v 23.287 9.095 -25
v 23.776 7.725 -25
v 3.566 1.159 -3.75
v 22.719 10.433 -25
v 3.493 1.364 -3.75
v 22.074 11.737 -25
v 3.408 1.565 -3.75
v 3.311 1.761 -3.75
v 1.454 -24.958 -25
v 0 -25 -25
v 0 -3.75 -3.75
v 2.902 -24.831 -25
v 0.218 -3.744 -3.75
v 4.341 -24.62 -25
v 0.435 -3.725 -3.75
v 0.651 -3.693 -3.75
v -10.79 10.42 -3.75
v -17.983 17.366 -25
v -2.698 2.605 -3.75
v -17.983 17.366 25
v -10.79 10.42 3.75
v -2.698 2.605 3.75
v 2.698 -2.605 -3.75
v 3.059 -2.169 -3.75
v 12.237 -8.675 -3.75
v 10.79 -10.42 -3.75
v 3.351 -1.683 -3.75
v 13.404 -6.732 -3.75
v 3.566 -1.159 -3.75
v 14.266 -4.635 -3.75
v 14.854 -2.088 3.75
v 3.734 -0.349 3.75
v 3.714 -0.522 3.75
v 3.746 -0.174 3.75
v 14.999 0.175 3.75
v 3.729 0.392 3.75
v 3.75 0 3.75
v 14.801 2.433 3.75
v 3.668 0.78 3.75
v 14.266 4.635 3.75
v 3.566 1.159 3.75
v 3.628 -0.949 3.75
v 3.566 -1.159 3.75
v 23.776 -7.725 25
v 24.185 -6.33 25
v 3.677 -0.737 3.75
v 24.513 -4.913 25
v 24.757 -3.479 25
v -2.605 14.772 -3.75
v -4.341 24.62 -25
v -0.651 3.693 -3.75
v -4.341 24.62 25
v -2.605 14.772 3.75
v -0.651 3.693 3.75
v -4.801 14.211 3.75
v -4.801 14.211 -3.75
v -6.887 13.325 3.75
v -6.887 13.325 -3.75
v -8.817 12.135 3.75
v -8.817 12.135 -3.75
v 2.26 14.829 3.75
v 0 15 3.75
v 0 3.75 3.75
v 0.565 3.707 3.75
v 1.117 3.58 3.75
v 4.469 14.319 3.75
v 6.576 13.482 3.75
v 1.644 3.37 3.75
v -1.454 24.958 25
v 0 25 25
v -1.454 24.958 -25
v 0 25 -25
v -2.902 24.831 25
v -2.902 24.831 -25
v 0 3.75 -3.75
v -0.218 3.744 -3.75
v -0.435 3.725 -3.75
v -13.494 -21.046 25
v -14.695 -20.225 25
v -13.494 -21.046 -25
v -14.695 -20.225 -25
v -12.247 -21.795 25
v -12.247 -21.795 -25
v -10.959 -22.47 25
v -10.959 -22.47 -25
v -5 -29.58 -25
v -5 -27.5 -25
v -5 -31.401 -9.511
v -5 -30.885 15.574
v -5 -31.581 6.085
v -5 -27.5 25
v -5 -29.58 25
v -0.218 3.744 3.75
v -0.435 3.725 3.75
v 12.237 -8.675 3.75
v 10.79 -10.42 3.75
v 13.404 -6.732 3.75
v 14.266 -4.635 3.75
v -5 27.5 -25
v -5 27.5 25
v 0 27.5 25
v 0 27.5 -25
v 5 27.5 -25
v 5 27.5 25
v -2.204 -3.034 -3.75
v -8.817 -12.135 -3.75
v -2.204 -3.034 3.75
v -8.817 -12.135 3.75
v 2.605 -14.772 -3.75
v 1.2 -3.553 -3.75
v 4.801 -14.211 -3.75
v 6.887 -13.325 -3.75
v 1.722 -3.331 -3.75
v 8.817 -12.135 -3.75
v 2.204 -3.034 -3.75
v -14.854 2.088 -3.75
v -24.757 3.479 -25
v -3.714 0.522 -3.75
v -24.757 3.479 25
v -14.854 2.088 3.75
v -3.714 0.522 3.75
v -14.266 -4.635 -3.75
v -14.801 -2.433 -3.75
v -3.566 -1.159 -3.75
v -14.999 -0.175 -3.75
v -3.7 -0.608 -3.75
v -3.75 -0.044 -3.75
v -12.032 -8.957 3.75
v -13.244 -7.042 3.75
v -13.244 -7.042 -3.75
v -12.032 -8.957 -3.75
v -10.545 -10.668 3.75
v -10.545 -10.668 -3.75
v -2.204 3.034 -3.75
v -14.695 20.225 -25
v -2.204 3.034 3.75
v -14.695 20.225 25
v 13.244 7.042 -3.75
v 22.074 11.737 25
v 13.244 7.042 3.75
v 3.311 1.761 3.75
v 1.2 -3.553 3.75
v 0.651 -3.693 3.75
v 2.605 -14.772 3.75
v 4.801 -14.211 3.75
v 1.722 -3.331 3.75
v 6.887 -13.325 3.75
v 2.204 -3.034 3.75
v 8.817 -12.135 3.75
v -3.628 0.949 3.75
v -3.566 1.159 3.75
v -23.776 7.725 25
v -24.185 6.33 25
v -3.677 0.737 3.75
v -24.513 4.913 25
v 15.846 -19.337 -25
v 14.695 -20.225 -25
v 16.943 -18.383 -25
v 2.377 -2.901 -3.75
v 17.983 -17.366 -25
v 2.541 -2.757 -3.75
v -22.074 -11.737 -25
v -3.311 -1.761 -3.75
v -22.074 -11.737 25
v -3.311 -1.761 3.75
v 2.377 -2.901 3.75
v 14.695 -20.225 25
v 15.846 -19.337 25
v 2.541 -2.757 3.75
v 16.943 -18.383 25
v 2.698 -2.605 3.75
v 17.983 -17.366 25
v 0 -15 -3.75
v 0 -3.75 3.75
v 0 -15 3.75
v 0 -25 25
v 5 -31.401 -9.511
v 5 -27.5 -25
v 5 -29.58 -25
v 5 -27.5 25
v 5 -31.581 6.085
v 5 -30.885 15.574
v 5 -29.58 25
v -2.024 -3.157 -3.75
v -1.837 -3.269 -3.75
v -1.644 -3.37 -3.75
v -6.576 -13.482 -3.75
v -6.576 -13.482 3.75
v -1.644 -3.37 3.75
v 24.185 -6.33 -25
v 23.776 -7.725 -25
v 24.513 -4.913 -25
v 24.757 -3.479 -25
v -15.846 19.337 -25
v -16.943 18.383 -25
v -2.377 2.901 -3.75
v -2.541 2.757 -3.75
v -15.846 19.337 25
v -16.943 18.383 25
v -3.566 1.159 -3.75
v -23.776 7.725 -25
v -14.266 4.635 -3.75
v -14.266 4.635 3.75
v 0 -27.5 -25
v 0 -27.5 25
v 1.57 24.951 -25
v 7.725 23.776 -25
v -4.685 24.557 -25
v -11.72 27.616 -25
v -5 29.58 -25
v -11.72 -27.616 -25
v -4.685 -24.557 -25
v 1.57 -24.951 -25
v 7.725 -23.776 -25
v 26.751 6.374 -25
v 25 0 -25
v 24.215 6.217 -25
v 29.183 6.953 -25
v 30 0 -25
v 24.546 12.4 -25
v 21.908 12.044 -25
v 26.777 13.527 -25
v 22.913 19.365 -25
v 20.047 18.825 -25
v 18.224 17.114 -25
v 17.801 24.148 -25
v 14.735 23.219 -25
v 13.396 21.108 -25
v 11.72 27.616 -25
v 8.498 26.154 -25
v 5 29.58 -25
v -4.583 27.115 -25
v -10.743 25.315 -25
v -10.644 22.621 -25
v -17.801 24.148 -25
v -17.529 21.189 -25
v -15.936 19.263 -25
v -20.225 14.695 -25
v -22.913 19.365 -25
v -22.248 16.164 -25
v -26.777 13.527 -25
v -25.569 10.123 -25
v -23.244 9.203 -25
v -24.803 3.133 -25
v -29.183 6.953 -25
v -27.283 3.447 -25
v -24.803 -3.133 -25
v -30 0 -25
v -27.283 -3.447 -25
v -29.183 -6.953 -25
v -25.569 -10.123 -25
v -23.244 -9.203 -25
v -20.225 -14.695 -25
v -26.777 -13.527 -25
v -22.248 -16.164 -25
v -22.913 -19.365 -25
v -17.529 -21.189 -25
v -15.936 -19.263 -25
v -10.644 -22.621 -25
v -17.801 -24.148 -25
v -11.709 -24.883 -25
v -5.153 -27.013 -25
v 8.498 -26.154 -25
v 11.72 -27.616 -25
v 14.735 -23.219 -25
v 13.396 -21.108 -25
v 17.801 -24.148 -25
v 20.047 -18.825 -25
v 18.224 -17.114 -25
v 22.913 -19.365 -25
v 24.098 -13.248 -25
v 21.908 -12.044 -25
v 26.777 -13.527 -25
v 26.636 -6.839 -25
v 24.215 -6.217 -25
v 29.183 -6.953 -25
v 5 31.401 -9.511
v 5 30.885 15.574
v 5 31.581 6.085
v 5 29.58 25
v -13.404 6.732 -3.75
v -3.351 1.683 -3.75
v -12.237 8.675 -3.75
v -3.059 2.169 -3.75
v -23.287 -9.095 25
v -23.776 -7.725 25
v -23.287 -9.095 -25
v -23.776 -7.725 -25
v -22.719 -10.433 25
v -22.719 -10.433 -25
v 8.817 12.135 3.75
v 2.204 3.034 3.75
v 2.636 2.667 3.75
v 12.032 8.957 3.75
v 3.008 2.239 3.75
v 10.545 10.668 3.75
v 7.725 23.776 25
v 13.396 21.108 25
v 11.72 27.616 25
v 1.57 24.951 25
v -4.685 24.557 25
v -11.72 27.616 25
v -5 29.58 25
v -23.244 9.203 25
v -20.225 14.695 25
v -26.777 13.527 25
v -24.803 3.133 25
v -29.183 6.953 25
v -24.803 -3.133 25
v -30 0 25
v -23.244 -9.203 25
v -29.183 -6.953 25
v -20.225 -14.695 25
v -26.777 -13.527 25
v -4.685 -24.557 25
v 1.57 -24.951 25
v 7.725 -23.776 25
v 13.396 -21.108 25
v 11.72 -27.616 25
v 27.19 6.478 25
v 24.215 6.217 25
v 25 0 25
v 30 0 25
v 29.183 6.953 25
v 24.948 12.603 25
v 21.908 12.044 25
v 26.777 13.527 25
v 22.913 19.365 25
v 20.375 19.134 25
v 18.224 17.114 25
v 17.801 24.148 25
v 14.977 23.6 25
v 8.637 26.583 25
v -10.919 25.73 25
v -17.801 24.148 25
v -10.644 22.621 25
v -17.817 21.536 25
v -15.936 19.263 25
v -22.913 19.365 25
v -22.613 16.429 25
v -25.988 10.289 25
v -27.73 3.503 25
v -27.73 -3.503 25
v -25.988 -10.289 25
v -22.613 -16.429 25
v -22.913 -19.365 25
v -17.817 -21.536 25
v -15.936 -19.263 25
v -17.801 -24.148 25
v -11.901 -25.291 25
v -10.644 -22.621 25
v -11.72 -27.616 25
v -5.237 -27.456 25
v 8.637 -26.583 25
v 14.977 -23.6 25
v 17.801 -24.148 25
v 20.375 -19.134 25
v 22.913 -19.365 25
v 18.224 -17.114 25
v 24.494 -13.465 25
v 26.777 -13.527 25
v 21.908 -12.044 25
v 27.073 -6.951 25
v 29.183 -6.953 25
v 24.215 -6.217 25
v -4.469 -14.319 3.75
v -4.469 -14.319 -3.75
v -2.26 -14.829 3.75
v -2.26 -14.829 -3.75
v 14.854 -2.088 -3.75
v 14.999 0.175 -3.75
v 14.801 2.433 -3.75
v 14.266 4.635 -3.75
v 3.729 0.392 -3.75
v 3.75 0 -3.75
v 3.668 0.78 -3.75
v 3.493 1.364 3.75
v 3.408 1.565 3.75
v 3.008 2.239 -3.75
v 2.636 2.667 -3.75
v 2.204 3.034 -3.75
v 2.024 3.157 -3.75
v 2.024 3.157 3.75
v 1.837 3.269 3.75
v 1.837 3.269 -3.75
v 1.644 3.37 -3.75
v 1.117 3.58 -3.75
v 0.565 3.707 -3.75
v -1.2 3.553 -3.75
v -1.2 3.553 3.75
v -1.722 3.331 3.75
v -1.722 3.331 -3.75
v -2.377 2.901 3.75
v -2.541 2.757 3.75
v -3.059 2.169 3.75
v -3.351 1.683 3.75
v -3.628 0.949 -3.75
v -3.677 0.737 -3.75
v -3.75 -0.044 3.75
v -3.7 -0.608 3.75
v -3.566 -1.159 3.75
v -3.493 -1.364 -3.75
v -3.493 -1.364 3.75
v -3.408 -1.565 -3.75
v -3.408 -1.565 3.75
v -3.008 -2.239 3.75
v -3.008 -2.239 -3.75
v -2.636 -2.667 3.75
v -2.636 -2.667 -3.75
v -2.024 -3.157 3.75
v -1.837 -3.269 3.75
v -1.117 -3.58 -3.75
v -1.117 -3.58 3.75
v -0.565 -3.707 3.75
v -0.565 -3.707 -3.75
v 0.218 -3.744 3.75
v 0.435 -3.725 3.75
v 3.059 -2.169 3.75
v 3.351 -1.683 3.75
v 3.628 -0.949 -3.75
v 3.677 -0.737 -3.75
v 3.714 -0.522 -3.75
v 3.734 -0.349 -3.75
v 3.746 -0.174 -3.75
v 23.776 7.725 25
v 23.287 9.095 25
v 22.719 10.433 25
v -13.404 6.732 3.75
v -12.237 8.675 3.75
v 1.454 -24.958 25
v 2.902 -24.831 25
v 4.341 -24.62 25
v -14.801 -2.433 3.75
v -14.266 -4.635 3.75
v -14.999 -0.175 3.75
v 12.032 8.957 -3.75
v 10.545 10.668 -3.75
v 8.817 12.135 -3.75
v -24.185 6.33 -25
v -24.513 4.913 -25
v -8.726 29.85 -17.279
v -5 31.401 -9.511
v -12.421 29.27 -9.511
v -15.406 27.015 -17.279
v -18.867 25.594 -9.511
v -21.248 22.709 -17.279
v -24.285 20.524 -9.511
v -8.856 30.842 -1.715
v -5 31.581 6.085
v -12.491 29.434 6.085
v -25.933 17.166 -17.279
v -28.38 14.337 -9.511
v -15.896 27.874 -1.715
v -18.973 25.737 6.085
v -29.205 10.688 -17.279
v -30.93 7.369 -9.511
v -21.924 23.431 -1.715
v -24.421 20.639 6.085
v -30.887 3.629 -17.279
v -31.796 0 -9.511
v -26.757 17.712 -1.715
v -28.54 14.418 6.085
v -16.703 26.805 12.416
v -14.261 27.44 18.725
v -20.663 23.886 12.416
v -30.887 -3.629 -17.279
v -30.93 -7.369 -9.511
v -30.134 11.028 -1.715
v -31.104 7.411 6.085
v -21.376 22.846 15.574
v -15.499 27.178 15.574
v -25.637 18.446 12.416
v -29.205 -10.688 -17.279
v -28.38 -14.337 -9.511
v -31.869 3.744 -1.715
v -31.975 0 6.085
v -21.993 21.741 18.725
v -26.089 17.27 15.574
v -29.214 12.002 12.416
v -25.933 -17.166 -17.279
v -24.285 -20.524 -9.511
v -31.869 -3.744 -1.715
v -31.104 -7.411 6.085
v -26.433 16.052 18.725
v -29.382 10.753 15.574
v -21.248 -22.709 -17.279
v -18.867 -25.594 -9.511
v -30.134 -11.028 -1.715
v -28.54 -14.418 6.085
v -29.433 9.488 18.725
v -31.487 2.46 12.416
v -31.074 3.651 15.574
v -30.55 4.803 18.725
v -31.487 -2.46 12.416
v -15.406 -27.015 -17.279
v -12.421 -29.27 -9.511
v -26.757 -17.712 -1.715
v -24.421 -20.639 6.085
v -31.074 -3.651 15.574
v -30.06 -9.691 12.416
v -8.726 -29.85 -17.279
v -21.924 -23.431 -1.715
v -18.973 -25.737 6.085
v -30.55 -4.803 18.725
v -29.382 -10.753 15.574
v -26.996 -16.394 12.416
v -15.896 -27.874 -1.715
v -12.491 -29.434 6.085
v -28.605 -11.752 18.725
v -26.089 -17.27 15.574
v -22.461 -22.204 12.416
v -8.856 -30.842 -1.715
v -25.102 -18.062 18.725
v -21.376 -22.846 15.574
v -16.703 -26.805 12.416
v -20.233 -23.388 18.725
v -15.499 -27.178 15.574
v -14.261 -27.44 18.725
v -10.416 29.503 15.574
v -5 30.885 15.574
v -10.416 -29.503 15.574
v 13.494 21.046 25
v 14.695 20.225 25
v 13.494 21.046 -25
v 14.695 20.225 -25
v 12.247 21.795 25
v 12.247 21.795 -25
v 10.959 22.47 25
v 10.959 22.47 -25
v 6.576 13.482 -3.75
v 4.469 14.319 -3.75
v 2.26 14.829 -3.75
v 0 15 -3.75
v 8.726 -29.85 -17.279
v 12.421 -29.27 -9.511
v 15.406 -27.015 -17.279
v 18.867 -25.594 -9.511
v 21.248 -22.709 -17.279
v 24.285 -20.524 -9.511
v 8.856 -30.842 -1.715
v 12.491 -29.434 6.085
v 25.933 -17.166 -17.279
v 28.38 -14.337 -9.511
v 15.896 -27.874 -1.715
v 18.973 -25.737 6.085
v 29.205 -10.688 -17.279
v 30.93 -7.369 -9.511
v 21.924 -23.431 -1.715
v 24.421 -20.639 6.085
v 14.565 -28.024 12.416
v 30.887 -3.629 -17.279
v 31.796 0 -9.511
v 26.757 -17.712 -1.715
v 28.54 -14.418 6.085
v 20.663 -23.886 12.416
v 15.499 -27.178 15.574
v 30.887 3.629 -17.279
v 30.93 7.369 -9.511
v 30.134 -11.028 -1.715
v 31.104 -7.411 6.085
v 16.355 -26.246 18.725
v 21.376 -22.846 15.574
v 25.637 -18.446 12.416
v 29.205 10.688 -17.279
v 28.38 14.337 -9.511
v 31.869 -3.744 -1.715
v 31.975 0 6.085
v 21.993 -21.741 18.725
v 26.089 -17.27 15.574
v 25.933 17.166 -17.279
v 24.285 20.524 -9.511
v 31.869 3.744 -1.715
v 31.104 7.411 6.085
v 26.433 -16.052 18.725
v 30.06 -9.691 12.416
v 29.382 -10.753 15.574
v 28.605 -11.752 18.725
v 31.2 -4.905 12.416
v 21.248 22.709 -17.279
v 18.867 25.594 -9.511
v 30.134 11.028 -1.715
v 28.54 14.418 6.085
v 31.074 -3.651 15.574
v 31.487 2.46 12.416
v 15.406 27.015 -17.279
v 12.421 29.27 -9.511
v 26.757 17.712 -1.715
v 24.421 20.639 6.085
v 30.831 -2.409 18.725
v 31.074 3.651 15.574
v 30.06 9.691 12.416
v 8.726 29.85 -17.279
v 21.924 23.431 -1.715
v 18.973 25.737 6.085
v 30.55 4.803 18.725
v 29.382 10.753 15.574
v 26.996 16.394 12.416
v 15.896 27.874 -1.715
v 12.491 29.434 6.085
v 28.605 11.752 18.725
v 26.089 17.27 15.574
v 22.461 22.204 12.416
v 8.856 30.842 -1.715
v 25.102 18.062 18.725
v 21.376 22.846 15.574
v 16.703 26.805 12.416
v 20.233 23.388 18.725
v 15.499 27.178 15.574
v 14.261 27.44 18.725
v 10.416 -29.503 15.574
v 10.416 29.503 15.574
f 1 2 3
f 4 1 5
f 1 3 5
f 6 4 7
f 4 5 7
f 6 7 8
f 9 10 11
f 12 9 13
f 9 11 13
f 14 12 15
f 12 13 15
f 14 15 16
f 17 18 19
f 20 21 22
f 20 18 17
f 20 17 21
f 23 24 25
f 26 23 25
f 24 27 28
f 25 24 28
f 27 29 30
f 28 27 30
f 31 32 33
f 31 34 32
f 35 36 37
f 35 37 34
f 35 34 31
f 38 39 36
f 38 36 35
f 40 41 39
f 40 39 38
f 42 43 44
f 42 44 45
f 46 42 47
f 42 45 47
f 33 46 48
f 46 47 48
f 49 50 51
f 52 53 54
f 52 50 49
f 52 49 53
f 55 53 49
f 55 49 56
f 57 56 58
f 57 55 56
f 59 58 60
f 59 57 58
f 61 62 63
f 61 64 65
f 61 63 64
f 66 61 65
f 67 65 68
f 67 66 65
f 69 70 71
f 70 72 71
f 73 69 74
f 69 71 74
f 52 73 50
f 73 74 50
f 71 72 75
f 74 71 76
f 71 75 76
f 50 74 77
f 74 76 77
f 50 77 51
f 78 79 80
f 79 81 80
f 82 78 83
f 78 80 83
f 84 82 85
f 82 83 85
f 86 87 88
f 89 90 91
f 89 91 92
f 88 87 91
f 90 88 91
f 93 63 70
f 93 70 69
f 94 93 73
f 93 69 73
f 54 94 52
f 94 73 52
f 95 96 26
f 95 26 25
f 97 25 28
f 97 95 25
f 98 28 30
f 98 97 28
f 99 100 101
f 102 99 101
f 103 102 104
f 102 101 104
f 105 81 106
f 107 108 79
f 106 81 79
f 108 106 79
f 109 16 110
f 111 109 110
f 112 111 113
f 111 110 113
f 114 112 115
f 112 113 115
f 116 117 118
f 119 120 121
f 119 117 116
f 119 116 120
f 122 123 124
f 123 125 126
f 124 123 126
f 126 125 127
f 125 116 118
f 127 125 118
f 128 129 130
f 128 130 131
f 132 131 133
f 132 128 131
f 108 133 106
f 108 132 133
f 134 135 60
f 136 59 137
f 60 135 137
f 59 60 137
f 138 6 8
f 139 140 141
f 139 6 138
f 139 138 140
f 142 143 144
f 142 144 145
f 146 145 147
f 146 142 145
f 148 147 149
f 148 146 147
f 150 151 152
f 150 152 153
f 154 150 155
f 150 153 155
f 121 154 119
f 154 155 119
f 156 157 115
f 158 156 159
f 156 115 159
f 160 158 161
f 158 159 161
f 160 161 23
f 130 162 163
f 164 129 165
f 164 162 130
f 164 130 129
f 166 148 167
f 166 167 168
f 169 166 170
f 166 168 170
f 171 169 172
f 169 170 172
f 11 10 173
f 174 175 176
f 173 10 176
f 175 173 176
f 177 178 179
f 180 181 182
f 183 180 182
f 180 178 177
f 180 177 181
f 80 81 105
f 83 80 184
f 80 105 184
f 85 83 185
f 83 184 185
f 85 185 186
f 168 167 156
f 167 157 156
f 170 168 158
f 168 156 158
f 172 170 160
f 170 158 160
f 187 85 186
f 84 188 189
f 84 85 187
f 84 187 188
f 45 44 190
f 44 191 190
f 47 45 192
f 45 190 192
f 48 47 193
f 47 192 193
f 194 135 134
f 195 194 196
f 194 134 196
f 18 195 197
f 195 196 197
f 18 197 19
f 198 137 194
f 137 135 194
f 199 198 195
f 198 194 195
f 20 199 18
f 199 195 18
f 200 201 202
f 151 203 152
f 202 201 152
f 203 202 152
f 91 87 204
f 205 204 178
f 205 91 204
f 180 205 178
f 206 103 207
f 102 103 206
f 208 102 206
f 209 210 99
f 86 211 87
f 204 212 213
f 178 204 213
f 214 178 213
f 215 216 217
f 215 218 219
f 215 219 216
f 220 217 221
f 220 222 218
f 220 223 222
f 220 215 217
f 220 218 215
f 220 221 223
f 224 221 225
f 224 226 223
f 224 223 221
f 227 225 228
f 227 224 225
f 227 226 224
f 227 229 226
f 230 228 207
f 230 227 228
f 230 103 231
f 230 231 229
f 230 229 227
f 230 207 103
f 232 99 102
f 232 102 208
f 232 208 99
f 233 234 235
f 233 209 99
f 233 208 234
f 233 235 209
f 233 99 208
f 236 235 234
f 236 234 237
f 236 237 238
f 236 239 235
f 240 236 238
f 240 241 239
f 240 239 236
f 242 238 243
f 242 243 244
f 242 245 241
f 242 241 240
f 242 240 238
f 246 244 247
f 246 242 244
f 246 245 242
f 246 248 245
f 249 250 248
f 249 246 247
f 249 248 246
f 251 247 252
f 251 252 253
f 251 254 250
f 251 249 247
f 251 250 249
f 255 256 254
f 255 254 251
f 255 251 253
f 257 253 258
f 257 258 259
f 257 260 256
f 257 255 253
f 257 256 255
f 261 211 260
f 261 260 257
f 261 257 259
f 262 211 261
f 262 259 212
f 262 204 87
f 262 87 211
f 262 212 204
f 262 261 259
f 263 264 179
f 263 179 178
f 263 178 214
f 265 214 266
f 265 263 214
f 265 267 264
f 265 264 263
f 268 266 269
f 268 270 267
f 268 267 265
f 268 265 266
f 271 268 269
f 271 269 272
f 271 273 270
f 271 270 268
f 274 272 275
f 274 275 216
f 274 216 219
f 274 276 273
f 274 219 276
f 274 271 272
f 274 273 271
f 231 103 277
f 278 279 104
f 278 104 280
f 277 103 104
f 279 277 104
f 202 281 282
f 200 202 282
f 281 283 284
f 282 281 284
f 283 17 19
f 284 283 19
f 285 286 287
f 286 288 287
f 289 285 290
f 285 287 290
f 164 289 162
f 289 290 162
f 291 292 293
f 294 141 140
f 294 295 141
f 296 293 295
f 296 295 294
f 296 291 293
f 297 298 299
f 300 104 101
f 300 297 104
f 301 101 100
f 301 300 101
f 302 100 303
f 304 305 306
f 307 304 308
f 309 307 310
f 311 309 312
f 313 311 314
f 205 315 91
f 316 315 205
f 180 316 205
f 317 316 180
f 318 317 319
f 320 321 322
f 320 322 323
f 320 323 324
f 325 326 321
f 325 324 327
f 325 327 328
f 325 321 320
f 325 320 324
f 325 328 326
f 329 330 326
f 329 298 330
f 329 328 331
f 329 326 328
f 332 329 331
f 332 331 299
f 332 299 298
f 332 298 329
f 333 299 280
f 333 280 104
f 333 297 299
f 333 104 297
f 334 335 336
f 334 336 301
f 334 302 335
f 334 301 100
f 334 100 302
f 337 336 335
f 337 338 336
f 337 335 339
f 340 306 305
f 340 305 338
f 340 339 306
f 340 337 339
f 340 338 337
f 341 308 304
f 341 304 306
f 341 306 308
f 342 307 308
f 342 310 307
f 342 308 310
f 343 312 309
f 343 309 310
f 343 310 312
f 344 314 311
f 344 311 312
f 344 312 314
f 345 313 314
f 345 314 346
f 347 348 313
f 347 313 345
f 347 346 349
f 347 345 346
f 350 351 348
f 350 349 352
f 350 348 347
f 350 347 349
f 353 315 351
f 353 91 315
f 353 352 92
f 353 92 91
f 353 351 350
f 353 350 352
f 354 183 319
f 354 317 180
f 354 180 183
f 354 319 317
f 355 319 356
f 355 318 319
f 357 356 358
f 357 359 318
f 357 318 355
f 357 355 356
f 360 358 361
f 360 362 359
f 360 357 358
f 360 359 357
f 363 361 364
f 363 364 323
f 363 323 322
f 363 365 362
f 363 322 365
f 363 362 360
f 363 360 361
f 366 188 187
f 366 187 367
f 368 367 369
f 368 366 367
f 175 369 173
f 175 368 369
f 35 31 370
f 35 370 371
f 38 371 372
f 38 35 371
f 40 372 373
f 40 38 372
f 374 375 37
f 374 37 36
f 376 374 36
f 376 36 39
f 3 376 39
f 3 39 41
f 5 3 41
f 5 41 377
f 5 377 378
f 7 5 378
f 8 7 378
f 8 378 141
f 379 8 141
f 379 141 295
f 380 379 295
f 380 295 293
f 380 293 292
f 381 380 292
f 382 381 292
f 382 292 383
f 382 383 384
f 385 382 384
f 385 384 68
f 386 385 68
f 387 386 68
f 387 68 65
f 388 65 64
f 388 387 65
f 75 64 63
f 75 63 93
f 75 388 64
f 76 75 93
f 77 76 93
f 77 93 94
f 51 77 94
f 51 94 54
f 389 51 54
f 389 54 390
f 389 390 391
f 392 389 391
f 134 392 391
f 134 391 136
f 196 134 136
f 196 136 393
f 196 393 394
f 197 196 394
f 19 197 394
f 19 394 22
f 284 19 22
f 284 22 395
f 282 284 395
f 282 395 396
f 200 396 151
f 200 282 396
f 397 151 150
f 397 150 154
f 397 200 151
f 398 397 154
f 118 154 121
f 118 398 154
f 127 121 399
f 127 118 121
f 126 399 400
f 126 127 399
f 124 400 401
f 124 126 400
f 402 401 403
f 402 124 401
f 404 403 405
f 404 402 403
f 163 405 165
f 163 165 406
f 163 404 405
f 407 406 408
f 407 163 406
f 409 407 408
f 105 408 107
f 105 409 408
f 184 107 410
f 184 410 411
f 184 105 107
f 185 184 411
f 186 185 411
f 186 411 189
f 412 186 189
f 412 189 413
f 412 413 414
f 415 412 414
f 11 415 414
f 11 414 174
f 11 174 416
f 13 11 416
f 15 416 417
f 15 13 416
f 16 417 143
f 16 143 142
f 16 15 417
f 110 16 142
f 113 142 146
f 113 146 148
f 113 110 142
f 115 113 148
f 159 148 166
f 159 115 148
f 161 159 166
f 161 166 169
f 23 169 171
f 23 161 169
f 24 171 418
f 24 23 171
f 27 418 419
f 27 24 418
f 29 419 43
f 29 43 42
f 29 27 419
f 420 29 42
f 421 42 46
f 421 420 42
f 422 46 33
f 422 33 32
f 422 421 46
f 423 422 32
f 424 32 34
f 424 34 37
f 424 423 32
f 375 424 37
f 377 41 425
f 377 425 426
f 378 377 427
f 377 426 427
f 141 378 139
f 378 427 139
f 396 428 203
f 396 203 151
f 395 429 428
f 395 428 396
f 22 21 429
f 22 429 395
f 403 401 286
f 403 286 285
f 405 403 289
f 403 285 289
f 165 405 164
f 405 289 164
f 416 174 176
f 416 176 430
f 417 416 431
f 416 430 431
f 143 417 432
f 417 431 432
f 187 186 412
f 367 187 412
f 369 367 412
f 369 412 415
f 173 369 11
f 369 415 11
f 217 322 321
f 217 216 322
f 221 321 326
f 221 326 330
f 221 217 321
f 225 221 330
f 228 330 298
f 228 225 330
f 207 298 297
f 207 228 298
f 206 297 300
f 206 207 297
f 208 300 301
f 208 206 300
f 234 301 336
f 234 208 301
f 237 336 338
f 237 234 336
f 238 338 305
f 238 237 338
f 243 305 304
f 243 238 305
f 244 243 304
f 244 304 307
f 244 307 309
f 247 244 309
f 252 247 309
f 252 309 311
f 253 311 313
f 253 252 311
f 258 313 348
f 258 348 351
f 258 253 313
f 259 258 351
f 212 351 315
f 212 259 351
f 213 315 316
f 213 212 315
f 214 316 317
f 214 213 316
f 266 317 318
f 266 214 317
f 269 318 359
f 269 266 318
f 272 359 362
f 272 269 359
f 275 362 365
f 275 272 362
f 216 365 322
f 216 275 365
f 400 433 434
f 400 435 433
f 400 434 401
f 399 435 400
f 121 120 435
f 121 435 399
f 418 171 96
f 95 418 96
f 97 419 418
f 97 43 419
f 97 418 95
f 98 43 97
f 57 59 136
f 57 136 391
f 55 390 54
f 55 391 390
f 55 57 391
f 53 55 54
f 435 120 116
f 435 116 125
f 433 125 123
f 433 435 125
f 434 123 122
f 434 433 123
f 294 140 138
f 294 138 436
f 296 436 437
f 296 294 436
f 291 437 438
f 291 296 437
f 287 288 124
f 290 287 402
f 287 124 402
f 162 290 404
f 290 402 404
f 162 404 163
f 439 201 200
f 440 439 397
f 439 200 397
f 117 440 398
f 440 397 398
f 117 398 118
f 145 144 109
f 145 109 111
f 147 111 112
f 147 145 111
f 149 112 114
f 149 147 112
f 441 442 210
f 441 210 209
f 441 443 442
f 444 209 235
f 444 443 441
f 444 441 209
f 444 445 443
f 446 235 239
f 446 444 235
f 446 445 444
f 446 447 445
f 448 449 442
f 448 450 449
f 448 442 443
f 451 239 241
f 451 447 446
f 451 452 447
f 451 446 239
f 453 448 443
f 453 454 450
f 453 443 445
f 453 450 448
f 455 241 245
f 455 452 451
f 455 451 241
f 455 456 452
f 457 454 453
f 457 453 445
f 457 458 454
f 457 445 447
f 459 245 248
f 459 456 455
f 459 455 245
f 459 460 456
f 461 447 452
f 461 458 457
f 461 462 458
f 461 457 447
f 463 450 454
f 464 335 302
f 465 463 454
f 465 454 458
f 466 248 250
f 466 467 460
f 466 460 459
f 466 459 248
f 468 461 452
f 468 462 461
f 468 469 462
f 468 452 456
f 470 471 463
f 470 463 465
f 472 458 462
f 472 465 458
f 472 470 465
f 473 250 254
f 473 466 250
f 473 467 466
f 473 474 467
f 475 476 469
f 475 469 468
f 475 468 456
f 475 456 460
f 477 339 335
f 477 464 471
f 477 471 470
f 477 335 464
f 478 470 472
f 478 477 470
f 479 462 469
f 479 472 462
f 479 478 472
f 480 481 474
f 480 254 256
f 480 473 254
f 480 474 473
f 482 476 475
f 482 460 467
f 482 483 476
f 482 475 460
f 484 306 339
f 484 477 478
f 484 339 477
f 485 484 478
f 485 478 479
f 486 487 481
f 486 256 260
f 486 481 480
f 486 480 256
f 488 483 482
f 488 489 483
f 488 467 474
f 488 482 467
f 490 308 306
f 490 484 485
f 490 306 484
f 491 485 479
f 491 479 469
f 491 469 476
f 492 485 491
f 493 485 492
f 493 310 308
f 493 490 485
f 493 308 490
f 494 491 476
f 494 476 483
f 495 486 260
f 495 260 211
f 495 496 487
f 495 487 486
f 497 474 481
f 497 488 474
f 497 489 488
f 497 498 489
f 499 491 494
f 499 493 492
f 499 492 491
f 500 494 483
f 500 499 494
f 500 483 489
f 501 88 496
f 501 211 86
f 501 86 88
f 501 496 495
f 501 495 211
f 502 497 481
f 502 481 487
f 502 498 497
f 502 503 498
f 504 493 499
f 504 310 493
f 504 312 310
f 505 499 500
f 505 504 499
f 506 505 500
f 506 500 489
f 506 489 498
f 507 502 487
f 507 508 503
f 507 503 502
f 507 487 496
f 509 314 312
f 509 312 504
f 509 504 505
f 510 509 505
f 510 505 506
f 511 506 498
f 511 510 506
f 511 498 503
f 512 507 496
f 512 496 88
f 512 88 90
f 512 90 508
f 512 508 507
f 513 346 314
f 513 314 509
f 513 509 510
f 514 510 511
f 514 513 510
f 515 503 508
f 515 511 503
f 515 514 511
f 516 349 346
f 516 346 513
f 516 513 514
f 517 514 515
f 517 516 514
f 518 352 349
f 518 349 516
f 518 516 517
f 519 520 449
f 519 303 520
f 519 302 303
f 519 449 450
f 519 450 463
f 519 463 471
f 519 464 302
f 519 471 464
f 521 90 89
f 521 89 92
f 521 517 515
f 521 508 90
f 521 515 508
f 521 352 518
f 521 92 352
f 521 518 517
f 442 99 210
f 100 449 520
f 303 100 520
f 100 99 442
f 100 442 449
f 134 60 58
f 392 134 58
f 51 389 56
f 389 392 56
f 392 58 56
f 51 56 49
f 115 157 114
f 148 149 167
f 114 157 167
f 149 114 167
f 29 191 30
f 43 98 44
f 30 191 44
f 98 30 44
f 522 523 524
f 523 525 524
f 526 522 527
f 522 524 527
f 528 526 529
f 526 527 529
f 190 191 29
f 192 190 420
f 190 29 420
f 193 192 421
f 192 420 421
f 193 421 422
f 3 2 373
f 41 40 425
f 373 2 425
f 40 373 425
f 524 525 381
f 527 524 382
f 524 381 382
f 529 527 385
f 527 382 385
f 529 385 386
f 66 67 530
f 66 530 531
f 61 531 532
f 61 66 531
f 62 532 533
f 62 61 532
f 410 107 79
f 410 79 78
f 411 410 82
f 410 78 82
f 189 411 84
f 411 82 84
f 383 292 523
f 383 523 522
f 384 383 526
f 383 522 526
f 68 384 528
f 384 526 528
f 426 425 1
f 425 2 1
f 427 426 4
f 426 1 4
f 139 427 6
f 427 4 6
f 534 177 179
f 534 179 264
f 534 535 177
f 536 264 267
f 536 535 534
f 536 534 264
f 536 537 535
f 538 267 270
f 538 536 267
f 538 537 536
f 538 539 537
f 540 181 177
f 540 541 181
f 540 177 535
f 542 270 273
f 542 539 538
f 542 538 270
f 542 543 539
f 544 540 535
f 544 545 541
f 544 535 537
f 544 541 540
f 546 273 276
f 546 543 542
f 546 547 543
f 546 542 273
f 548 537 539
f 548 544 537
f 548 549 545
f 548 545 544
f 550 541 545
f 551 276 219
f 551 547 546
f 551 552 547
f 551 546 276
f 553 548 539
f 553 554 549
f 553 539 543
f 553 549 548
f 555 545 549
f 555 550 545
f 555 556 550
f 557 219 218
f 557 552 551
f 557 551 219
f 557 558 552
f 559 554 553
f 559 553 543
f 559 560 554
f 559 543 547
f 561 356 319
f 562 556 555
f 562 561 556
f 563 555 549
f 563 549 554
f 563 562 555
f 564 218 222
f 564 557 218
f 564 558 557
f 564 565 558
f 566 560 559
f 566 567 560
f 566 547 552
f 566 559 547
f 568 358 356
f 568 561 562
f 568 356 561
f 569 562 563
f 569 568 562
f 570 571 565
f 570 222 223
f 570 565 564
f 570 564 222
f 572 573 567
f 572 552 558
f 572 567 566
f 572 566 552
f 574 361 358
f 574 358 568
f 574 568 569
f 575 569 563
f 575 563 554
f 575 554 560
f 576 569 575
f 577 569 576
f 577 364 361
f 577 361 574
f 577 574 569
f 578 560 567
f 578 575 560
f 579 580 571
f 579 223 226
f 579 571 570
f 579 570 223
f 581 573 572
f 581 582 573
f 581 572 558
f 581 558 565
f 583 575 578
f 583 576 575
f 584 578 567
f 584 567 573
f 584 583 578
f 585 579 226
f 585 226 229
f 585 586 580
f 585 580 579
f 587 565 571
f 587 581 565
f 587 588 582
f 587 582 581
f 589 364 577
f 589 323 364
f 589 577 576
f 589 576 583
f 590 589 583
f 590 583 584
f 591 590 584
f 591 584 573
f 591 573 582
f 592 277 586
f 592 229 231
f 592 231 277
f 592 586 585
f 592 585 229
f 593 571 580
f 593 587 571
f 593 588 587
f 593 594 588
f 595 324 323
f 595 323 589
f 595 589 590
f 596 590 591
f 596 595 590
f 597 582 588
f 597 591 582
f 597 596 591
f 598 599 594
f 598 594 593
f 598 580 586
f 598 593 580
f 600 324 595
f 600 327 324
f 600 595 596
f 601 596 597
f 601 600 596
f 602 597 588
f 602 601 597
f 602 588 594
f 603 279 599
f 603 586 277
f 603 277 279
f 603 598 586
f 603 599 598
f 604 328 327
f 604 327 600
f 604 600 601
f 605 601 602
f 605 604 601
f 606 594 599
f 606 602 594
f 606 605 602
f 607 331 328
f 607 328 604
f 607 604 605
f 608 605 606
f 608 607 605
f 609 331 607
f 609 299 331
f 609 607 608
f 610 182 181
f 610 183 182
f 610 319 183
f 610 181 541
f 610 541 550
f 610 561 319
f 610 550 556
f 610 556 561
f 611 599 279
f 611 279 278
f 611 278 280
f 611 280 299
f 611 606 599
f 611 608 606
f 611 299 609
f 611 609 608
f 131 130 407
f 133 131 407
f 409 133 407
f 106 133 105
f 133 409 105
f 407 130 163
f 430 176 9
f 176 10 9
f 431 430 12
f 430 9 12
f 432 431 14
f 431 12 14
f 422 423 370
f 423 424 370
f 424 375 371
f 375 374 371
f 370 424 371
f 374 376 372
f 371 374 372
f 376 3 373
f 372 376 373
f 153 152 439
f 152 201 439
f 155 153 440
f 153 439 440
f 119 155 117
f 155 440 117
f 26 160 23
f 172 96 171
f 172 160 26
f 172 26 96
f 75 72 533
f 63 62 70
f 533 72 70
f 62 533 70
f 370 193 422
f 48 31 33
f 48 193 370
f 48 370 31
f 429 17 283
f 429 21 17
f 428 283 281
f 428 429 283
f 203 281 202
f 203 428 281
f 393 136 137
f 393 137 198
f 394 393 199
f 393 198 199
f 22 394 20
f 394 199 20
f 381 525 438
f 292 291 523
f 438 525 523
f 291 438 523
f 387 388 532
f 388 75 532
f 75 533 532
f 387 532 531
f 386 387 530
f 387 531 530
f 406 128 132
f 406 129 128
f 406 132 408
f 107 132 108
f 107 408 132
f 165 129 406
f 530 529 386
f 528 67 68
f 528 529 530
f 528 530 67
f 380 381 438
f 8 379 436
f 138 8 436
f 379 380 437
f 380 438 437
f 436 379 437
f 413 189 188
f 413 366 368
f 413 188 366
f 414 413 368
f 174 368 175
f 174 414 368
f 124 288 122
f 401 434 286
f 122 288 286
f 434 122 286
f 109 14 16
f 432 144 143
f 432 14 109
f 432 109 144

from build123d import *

# Parameters (mm, degrees)
SKETCH4_R           = 15
SKETCH4_R_2         = 3.75
BOSS_EXTRUDE1_DEPTH = 3.75
REVOLVE1_ANGLE      = 10
CIRPATTERN1_COUNT   = 10
SKETCH7_W           = 10
SKETCH7_H           = 7.5
CUT_EXTRUDE1_DEPTH  = 52.822426825


with BuildPart() as part:
    # Sweep1: sweep along a path in Sketch3
    with BuildLine(Plane.XY) as sweep1_path:
        CenterArc((0, 0), 30, 0, 360)
    # Sketch1 → Sweep1 (sweep)
    with BuildSketch(Plane(origin=(0, 0, 0), x_dir=(0, 0, -1), z_dir=(1, 0, 0))):
        with BuildLine():
            Line((-25, 30), (-25, 25))
            Line((-25, 25), (25, 25))
            Line((25, 25), (25, 30))
            ThreePointArc((25, 30), (0, 32.098005423), (-25, 30))
        make_face()
    sweep(path=sweep1_path.line)

    # Sketch7 → Cut-Extrude1 (cut, symmetric)
    with BuildSketch(Plane.XY):
        with Locations((0, 31.25)):
            Rectangle(SKETCH7_W, SKETCH7_H)
    cut_extrude1 = extrude(amount=CUT_EXTRUDE1_DEPTH, both=True, mode=Mode.SUBTRACT)

    # Mirror1: Cut-Extrude1 across plane
    add(cut_extrude1.mirror(Plane.ZX), mode=Mode.SUBTRACT)


with BuildPart() as body_2:
    # Sketch4 → Boss-Extrude1 (new, symmetric)
    with BuildSketch(Plane.XY):
        Circle(SKETCH4_R)
        Circle(SKETCH4_R_2, mode=Mode.SUBTRACT)
    extrude(amount=BOSS_EXTRUDE1_DEPTH, both=True)

    # Sketch6 → Revolve1 (revolve)
    with BuildSketch(Plane(origin=(0, 0, 0), x_dir=(0, 0, -1), z_dir=(1, 0, 0))):
        Polygon((-25, 25), (25, 25), (3.75, 3.75), (3.75, 15), (-3.75, 15), (-3.75, 3.75), align=None)
    revolve1 = revolve(axis=Axis((0, 0, -26.331150218), (0, 0, 1)), revolution_arc=REVOLVE1_ANGLE)

    # CirPattern1: Revolve1 ×10 about axis
    cirpattern1_axis = Axis((0, 0, 0), (0, 0, 1))
    for i in range(1, CIRPATTERN1_COUNT):
        add(revolve1.rotate(cirpattern1_axis, i * 360 / CIRPATTERN1_COUNT))


solid = Compound([part.part, body_2.part])
